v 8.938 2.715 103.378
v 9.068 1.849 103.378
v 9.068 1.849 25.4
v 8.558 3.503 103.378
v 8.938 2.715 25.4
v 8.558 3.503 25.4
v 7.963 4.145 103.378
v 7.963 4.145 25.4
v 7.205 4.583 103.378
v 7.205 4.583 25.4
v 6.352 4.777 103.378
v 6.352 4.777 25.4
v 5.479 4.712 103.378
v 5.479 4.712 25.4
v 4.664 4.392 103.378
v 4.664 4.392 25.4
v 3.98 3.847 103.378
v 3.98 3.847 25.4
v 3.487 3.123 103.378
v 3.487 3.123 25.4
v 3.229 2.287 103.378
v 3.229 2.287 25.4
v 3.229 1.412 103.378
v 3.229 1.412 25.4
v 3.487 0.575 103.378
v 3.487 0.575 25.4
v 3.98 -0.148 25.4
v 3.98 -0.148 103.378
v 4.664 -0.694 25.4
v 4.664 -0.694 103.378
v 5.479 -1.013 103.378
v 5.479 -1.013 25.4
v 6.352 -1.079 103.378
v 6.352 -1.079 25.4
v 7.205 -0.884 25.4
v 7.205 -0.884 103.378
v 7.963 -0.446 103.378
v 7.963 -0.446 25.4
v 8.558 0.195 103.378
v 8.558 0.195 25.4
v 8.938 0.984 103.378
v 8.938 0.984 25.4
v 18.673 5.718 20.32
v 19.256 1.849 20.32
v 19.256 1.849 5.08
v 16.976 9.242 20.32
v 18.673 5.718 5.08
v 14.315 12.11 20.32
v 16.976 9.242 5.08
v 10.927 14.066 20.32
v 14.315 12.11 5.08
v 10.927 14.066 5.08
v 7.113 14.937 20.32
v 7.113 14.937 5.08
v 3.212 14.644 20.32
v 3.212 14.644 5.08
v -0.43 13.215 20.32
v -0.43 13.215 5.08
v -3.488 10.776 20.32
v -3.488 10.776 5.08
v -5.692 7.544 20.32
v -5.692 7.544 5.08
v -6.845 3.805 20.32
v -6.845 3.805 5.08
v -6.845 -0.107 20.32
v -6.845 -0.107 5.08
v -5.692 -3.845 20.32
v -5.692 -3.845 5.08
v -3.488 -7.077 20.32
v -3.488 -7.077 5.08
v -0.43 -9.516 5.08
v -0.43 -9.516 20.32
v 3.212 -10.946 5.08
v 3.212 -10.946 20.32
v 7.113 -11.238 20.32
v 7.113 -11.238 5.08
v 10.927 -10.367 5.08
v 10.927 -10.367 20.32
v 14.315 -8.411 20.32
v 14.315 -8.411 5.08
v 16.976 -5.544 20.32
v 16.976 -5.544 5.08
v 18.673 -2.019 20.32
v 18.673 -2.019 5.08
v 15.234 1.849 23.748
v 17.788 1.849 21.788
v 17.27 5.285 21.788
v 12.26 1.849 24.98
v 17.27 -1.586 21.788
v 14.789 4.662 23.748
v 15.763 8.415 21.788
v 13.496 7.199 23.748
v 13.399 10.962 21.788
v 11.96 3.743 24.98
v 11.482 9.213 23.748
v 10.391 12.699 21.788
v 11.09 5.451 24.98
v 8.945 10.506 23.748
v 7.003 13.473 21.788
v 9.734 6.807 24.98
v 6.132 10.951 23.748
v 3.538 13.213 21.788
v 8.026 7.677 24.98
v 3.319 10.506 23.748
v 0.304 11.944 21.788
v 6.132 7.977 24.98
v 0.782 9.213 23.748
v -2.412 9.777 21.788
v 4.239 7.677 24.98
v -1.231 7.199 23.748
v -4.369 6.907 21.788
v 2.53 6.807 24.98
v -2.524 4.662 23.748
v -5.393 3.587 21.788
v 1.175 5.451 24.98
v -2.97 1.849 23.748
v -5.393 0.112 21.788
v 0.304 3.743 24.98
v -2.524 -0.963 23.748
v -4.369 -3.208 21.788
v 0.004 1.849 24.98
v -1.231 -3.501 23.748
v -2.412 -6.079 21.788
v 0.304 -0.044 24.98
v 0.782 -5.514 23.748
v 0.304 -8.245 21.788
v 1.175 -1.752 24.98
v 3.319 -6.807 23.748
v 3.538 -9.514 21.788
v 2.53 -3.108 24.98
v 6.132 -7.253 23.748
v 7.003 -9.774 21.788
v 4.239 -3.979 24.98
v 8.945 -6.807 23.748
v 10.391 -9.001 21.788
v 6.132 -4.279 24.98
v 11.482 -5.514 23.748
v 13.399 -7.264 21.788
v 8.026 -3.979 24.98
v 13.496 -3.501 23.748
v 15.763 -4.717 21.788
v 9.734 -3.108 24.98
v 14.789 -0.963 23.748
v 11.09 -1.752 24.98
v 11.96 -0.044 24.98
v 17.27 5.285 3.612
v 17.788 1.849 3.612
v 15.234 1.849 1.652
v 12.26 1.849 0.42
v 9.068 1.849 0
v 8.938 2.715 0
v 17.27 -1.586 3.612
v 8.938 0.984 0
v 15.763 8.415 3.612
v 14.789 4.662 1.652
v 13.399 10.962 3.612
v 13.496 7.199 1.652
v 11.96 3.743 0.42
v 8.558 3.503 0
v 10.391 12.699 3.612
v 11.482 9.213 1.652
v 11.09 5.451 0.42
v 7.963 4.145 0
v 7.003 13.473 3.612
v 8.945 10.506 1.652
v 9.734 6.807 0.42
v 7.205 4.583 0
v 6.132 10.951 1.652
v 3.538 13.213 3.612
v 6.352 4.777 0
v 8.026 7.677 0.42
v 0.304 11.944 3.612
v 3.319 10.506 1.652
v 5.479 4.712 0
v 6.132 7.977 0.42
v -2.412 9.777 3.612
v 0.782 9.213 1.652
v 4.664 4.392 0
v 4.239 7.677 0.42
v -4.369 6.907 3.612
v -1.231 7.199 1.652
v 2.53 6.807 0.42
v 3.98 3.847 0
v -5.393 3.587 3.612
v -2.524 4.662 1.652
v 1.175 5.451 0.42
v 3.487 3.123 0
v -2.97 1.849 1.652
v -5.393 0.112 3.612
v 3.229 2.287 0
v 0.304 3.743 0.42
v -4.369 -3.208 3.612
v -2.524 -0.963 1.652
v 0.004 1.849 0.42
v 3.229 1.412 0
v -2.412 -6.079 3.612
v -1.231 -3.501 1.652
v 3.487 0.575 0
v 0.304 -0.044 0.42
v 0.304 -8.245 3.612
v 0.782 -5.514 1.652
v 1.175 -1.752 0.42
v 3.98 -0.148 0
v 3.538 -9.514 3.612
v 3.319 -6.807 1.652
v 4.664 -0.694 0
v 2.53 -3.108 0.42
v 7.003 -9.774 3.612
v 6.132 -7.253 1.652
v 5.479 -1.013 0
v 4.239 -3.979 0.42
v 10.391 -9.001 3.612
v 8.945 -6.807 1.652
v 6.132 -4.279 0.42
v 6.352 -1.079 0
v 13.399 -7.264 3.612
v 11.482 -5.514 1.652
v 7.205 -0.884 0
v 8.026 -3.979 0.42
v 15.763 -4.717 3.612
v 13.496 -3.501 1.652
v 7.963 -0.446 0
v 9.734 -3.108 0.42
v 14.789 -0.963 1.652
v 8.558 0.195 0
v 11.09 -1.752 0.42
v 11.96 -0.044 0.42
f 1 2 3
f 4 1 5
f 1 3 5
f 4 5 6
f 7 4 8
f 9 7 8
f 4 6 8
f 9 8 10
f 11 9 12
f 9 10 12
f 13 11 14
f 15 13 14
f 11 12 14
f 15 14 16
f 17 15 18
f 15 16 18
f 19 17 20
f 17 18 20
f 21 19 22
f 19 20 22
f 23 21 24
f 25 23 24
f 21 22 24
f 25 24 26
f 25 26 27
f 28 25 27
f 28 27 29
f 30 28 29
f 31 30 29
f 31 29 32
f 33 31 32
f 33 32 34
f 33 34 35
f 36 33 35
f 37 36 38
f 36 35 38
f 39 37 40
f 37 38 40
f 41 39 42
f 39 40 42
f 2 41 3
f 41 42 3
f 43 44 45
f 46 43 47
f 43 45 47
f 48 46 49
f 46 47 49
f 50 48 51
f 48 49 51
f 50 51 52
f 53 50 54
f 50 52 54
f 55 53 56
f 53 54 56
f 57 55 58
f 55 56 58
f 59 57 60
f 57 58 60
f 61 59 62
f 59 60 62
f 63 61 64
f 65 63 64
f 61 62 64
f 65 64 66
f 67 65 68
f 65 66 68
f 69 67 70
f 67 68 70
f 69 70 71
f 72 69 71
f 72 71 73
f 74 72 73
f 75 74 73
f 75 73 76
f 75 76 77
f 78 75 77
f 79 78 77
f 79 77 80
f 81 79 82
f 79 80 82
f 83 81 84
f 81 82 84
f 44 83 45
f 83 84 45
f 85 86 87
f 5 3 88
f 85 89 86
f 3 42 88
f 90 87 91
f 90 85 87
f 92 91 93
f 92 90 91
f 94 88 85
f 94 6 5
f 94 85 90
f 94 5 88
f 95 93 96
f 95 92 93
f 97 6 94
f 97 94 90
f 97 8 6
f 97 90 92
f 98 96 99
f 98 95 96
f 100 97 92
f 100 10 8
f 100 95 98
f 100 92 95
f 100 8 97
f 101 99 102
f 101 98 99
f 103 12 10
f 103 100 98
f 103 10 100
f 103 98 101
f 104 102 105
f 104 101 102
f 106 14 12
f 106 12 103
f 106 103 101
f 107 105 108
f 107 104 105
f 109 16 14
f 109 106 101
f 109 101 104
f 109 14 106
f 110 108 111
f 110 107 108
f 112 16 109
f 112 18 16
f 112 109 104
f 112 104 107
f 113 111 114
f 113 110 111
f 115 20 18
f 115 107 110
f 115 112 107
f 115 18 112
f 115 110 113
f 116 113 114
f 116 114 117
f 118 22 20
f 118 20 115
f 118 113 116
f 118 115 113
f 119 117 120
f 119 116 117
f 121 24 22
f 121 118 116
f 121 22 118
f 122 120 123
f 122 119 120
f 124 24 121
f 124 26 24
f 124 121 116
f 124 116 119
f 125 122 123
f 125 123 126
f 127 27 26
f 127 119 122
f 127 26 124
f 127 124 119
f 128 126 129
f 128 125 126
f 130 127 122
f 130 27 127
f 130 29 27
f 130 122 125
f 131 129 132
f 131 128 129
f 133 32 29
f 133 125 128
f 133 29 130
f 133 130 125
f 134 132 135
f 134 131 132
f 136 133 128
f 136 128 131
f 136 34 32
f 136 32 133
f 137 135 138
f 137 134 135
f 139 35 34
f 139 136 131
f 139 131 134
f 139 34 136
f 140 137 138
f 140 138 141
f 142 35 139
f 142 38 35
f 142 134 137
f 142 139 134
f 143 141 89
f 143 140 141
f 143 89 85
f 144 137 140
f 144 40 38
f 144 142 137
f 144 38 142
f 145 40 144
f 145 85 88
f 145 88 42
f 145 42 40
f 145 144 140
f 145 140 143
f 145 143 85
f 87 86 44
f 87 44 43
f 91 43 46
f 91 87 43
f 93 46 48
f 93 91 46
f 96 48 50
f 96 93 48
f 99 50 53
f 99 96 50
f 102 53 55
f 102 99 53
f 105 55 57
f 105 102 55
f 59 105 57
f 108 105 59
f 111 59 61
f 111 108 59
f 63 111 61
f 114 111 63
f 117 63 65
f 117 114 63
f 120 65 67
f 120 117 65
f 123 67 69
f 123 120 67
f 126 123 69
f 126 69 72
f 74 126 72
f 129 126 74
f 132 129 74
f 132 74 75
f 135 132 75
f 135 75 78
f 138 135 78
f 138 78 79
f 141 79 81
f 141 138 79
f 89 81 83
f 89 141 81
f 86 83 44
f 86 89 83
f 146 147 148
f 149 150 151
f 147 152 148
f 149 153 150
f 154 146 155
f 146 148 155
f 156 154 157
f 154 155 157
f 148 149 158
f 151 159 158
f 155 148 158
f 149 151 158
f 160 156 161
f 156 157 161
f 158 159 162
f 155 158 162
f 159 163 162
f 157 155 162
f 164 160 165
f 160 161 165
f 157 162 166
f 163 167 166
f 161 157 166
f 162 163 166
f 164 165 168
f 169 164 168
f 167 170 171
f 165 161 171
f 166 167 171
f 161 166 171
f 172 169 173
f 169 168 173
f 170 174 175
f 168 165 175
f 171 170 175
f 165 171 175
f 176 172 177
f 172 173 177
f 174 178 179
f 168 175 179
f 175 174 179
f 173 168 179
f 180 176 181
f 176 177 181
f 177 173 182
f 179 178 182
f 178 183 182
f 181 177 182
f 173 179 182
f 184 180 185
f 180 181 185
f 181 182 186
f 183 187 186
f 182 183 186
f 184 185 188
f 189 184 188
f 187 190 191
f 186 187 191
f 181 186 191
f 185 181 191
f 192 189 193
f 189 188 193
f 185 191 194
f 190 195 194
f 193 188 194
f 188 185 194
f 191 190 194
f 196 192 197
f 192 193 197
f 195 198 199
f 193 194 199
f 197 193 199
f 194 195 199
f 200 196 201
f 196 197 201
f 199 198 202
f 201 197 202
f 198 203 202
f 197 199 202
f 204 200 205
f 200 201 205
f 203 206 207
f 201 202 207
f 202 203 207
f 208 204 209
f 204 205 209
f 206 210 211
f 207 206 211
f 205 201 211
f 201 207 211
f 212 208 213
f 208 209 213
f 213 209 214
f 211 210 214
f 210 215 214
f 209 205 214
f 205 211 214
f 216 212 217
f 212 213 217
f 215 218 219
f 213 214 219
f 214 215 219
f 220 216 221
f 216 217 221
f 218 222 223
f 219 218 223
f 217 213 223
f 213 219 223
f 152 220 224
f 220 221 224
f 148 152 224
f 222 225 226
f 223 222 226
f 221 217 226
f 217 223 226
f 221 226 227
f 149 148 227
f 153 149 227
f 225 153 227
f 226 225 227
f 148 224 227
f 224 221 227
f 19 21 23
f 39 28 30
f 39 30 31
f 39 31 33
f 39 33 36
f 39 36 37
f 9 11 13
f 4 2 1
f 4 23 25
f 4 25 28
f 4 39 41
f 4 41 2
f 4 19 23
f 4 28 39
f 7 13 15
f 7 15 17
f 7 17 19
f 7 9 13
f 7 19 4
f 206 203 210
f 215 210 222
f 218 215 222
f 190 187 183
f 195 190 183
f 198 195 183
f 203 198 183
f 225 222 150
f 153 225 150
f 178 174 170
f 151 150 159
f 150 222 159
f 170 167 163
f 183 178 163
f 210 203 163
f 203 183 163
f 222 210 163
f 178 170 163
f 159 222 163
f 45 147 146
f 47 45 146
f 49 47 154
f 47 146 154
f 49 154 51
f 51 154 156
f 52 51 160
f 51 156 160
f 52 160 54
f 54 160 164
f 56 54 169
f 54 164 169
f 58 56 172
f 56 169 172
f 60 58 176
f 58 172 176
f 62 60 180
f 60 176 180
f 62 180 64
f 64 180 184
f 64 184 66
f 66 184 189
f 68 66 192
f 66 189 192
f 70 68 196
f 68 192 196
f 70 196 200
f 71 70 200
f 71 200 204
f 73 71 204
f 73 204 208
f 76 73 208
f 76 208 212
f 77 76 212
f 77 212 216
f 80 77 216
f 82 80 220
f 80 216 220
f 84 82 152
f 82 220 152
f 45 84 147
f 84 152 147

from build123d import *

# Parameters (mm, degrees)
F0_R     = 13.1240937351
F1_DEPTH = 25.4
F2_SIZE  = 5.08
F3_R     = 12.3312643235
F4_DEPTH = 25.4
F5_DEPTH = 52.578
F6_R     = 12.3312643235


with BuildPart() as f1:
    # F0 (on Top) → F1 (new body)
    with BuildSketch(Plane.XY):
        with Locations((6.1321523972, 1.8493796233)):
            Circle(F0_R)
    extrude(amount=F1_DEPTH)

    # F2
    f2_edges = [f1.edges().sort_by_distance(p)[0] for p in [
        (-6.991941, 1.84938, 25.4),
        (-6.991941, 1.84938, 0),
    ]]
    chamfer(f2_edges, length=F2_SIZE)

    # F3
    f3_edges = [f1.edges().sort_by_distance(p)[0] for p in [
        (-1.911941, 1.84938, 25.4),
    ]]
    fillet(f3_edges, radius=F3_R)

    # F4 (add): a face of the model
    f4_faces = [f1.faces().sort_by_distance(p)[0] for p in [
        (6.1321523972, 1.8493796233, 25.4),
    ]]
    extrude(f4_faces, amount=F4_DEPTH)

    # F5 (add): a face of the model
    f5_faces = [f1.faces().sort_by_distance(p)[0] for p in [
        (6.1321523972, 1.8493796233, 50.8),
    ]]
    extrude(f5_faces, amount=F5_DEPTH)

    # F6
    f6_edges = [f1.edges().sort_by_distance(p)[0] for p in [
        (-1.911941, 1.84938, 0),
    ]]
    fillet(f6_edges, radius=F6_R)


solid = f1.part
